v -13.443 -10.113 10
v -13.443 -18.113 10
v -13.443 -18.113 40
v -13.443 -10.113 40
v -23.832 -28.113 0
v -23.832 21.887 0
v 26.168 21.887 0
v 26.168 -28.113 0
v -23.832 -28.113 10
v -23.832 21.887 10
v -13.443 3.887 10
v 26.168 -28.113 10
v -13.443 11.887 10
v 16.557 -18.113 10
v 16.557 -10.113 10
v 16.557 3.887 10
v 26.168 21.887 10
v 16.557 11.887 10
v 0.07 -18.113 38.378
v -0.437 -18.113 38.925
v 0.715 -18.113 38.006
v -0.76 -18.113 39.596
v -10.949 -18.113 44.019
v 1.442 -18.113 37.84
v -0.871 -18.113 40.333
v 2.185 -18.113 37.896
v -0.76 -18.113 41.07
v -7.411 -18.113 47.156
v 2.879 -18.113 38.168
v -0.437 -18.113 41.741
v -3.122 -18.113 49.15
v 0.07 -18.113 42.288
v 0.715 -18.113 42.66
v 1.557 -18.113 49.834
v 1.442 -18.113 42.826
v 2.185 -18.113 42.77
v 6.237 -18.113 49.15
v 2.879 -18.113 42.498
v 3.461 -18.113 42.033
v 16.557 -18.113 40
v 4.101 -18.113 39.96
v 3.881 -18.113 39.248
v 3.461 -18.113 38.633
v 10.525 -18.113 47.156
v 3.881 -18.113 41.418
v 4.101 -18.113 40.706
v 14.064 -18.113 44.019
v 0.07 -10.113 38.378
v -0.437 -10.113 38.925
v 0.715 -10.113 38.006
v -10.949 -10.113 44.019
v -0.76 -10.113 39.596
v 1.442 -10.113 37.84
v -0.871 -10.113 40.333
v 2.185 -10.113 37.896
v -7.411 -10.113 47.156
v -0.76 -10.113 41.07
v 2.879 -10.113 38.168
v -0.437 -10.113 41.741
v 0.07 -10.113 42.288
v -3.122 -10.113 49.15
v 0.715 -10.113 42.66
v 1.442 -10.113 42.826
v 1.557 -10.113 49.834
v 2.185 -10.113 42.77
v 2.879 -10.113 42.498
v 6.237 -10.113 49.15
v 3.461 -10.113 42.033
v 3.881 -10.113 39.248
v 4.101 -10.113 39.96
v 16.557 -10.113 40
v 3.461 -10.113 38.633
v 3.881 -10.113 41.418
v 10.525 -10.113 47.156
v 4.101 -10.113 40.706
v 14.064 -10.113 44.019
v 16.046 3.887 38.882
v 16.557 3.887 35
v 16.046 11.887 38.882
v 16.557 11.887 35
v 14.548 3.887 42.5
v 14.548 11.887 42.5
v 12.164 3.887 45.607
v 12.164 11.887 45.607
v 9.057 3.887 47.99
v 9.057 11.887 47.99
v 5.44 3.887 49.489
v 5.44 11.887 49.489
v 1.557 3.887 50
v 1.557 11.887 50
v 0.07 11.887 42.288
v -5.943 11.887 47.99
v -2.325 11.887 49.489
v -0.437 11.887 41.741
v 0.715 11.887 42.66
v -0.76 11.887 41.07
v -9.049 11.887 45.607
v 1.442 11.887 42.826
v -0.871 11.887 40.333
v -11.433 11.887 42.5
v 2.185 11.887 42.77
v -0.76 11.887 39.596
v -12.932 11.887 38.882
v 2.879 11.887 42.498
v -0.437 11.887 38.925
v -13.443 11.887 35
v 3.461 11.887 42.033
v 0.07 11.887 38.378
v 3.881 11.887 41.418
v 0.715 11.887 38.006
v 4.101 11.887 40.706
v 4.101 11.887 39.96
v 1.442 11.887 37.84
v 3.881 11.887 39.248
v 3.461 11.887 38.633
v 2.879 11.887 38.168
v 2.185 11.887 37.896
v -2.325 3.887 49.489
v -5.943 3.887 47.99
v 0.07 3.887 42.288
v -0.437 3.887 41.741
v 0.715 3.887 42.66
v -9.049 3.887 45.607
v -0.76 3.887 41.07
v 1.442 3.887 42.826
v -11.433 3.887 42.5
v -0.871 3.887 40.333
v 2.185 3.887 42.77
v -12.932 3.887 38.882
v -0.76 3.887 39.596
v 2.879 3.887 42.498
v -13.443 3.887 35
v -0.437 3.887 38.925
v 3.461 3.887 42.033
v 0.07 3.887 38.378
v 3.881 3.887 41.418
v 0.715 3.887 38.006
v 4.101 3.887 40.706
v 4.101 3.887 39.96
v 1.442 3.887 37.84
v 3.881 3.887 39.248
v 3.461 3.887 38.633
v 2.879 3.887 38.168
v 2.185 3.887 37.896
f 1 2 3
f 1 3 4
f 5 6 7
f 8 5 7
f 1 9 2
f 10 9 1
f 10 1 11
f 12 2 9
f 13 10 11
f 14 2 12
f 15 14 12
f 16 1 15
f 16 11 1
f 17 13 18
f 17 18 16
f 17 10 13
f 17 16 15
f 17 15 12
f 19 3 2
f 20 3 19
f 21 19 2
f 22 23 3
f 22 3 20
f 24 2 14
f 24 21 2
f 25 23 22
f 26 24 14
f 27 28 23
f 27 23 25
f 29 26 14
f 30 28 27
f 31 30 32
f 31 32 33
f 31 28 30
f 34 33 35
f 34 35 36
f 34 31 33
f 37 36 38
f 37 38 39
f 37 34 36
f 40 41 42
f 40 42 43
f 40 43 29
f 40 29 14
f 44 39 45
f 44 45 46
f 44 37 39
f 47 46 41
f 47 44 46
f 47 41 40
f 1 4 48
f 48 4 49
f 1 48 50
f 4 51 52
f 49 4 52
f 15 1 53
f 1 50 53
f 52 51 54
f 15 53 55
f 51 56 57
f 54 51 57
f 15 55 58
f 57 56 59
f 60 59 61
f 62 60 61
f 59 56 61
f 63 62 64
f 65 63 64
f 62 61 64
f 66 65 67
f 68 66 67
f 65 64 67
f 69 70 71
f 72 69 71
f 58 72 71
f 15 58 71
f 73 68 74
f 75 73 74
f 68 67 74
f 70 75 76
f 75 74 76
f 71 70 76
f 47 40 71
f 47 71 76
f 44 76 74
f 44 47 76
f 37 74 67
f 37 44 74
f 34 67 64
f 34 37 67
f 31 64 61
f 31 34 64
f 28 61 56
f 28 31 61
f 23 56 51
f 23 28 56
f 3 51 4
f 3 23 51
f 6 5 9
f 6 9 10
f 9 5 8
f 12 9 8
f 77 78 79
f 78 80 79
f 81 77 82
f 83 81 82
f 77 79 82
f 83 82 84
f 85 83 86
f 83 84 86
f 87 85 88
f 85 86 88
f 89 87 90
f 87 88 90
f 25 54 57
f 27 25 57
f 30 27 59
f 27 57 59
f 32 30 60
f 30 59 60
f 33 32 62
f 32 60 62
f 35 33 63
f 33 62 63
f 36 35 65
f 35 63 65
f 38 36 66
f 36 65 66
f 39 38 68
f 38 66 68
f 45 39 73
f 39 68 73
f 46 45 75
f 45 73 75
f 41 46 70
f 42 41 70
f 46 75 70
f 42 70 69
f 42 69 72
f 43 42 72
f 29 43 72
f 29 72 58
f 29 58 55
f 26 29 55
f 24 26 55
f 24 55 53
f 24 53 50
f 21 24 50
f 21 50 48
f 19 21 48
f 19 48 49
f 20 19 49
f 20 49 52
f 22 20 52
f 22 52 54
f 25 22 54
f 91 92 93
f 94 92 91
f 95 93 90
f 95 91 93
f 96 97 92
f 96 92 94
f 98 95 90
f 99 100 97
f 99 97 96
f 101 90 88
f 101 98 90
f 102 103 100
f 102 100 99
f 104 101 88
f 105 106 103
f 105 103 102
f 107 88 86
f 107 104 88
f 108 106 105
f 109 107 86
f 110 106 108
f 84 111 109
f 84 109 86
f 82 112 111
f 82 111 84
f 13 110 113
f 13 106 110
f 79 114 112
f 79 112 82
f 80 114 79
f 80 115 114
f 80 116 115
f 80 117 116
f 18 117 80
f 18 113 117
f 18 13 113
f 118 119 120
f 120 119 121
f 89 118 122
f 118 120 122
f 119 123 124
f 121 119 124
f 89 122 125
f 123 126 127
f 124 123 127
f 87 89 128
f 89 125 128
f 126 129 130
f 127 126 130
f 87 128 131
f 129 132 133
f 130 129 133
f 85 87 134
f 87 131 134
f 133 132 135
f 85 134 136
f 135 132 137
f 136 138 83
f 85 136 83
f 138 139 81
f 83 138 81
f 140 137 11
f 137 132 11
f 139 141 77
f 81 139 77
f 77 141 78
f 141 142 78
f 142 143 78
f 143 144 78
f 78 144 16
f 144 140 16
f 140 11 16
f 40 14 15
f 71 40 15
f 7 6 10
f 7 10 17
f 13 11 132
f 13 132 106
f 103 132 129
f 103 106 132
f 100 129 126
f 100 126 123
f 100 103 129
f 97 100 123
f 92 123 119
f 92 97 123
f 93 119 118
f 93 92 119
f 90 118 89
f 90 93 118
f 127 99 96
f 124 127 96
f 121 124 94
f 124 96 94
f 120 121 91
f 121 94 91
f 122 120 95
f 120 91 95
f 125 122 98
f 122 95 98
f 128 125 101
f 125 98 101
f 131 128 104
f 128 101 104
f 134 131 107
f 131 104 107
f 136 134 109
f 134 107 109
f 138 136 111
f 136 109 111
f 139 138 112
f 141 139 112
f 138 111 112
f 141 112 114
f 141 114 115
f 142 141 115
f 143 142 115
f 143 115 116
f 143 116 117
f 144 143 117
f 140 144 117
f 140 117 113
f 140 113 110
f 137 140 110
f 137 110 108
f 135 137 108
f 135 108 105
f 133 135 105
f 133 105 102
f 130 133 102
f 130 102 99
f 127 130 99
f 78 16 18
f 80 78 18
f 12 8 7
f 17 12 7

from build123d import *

# Parameters (mm, degrees)
F0_W     = 50
F0_H     = 50
F1_DEPTH = 10
F2_W     = 30
F2_H     = 8
F3_DEPTH = 40
F4_W     = 30
F4_H     = 8
F5_DEPTH = 30
F7_DEPTH = 8
F9_R     = 14.99999
F11_D    = 5


# Not quite as in the source:
# - a fillet or chamfer is up to 0.001 mm smaller than in the source, because OpenCascade refuses the exact size


with BuildPart() as f1:
    # F0 (on Top) → F1 (new body)
    with BuildSketch(Plane.XY):
        with Locations((1.1680293828, -3.1129003775)):
            Rectangle(F0_W, F0_H)
    extrude(amount=F1_DEPTH)

    # F2 (on face) → F3 (join)
    with BuildSketch(Plane.XY.offset(10)):
        with Locations((1.5573729761, 7.8870996225)):
            Rectangle(F2_W, F2_H)
    extrude(amount=F3_DEPTH)

    # F4 (on face) → F5 (join)
    with BuildSketch(Plane.XY.offset(10)):
        with Locations((1.5573729761, -14.1129003775)):
            Rectangle(F4_W, F4_H)
    extrude(amount=F5_DEPTH)

    # F6 (on face) → F7 (join)
    with BuildSketch(Plane.XZ.offset(18.1129003775)):
        with BuildLine():
            Line((-13.4426270239, 40), (16.5573729761, 40))
            ThreePointArc((16.5573729761, 40), (1.5573729761, 49.8339152222), (-13.4426270239, 40))
        make_face()
    extrude(amount=-F7_DEPTH)

    # F9 (radius 15 in the source; OpenCascade refuses exactly that, so slightly less here)
    f9_edges = [f1.edges().sort_by_distance(p)[0] for p in [
        (16.557373, 7.8871, 50),
        (-13.442627, 7.8871, 50),
    ]]
    fillet(f9_edges, radius=F9_R)

    # F11 (through all)
    with Locations(Plane.XZ.offset(18.1129003775)):
        with Locations((1.6286504688, 40.3330288827)):
            Hole(F11_D / 2)


solid = f1.part
